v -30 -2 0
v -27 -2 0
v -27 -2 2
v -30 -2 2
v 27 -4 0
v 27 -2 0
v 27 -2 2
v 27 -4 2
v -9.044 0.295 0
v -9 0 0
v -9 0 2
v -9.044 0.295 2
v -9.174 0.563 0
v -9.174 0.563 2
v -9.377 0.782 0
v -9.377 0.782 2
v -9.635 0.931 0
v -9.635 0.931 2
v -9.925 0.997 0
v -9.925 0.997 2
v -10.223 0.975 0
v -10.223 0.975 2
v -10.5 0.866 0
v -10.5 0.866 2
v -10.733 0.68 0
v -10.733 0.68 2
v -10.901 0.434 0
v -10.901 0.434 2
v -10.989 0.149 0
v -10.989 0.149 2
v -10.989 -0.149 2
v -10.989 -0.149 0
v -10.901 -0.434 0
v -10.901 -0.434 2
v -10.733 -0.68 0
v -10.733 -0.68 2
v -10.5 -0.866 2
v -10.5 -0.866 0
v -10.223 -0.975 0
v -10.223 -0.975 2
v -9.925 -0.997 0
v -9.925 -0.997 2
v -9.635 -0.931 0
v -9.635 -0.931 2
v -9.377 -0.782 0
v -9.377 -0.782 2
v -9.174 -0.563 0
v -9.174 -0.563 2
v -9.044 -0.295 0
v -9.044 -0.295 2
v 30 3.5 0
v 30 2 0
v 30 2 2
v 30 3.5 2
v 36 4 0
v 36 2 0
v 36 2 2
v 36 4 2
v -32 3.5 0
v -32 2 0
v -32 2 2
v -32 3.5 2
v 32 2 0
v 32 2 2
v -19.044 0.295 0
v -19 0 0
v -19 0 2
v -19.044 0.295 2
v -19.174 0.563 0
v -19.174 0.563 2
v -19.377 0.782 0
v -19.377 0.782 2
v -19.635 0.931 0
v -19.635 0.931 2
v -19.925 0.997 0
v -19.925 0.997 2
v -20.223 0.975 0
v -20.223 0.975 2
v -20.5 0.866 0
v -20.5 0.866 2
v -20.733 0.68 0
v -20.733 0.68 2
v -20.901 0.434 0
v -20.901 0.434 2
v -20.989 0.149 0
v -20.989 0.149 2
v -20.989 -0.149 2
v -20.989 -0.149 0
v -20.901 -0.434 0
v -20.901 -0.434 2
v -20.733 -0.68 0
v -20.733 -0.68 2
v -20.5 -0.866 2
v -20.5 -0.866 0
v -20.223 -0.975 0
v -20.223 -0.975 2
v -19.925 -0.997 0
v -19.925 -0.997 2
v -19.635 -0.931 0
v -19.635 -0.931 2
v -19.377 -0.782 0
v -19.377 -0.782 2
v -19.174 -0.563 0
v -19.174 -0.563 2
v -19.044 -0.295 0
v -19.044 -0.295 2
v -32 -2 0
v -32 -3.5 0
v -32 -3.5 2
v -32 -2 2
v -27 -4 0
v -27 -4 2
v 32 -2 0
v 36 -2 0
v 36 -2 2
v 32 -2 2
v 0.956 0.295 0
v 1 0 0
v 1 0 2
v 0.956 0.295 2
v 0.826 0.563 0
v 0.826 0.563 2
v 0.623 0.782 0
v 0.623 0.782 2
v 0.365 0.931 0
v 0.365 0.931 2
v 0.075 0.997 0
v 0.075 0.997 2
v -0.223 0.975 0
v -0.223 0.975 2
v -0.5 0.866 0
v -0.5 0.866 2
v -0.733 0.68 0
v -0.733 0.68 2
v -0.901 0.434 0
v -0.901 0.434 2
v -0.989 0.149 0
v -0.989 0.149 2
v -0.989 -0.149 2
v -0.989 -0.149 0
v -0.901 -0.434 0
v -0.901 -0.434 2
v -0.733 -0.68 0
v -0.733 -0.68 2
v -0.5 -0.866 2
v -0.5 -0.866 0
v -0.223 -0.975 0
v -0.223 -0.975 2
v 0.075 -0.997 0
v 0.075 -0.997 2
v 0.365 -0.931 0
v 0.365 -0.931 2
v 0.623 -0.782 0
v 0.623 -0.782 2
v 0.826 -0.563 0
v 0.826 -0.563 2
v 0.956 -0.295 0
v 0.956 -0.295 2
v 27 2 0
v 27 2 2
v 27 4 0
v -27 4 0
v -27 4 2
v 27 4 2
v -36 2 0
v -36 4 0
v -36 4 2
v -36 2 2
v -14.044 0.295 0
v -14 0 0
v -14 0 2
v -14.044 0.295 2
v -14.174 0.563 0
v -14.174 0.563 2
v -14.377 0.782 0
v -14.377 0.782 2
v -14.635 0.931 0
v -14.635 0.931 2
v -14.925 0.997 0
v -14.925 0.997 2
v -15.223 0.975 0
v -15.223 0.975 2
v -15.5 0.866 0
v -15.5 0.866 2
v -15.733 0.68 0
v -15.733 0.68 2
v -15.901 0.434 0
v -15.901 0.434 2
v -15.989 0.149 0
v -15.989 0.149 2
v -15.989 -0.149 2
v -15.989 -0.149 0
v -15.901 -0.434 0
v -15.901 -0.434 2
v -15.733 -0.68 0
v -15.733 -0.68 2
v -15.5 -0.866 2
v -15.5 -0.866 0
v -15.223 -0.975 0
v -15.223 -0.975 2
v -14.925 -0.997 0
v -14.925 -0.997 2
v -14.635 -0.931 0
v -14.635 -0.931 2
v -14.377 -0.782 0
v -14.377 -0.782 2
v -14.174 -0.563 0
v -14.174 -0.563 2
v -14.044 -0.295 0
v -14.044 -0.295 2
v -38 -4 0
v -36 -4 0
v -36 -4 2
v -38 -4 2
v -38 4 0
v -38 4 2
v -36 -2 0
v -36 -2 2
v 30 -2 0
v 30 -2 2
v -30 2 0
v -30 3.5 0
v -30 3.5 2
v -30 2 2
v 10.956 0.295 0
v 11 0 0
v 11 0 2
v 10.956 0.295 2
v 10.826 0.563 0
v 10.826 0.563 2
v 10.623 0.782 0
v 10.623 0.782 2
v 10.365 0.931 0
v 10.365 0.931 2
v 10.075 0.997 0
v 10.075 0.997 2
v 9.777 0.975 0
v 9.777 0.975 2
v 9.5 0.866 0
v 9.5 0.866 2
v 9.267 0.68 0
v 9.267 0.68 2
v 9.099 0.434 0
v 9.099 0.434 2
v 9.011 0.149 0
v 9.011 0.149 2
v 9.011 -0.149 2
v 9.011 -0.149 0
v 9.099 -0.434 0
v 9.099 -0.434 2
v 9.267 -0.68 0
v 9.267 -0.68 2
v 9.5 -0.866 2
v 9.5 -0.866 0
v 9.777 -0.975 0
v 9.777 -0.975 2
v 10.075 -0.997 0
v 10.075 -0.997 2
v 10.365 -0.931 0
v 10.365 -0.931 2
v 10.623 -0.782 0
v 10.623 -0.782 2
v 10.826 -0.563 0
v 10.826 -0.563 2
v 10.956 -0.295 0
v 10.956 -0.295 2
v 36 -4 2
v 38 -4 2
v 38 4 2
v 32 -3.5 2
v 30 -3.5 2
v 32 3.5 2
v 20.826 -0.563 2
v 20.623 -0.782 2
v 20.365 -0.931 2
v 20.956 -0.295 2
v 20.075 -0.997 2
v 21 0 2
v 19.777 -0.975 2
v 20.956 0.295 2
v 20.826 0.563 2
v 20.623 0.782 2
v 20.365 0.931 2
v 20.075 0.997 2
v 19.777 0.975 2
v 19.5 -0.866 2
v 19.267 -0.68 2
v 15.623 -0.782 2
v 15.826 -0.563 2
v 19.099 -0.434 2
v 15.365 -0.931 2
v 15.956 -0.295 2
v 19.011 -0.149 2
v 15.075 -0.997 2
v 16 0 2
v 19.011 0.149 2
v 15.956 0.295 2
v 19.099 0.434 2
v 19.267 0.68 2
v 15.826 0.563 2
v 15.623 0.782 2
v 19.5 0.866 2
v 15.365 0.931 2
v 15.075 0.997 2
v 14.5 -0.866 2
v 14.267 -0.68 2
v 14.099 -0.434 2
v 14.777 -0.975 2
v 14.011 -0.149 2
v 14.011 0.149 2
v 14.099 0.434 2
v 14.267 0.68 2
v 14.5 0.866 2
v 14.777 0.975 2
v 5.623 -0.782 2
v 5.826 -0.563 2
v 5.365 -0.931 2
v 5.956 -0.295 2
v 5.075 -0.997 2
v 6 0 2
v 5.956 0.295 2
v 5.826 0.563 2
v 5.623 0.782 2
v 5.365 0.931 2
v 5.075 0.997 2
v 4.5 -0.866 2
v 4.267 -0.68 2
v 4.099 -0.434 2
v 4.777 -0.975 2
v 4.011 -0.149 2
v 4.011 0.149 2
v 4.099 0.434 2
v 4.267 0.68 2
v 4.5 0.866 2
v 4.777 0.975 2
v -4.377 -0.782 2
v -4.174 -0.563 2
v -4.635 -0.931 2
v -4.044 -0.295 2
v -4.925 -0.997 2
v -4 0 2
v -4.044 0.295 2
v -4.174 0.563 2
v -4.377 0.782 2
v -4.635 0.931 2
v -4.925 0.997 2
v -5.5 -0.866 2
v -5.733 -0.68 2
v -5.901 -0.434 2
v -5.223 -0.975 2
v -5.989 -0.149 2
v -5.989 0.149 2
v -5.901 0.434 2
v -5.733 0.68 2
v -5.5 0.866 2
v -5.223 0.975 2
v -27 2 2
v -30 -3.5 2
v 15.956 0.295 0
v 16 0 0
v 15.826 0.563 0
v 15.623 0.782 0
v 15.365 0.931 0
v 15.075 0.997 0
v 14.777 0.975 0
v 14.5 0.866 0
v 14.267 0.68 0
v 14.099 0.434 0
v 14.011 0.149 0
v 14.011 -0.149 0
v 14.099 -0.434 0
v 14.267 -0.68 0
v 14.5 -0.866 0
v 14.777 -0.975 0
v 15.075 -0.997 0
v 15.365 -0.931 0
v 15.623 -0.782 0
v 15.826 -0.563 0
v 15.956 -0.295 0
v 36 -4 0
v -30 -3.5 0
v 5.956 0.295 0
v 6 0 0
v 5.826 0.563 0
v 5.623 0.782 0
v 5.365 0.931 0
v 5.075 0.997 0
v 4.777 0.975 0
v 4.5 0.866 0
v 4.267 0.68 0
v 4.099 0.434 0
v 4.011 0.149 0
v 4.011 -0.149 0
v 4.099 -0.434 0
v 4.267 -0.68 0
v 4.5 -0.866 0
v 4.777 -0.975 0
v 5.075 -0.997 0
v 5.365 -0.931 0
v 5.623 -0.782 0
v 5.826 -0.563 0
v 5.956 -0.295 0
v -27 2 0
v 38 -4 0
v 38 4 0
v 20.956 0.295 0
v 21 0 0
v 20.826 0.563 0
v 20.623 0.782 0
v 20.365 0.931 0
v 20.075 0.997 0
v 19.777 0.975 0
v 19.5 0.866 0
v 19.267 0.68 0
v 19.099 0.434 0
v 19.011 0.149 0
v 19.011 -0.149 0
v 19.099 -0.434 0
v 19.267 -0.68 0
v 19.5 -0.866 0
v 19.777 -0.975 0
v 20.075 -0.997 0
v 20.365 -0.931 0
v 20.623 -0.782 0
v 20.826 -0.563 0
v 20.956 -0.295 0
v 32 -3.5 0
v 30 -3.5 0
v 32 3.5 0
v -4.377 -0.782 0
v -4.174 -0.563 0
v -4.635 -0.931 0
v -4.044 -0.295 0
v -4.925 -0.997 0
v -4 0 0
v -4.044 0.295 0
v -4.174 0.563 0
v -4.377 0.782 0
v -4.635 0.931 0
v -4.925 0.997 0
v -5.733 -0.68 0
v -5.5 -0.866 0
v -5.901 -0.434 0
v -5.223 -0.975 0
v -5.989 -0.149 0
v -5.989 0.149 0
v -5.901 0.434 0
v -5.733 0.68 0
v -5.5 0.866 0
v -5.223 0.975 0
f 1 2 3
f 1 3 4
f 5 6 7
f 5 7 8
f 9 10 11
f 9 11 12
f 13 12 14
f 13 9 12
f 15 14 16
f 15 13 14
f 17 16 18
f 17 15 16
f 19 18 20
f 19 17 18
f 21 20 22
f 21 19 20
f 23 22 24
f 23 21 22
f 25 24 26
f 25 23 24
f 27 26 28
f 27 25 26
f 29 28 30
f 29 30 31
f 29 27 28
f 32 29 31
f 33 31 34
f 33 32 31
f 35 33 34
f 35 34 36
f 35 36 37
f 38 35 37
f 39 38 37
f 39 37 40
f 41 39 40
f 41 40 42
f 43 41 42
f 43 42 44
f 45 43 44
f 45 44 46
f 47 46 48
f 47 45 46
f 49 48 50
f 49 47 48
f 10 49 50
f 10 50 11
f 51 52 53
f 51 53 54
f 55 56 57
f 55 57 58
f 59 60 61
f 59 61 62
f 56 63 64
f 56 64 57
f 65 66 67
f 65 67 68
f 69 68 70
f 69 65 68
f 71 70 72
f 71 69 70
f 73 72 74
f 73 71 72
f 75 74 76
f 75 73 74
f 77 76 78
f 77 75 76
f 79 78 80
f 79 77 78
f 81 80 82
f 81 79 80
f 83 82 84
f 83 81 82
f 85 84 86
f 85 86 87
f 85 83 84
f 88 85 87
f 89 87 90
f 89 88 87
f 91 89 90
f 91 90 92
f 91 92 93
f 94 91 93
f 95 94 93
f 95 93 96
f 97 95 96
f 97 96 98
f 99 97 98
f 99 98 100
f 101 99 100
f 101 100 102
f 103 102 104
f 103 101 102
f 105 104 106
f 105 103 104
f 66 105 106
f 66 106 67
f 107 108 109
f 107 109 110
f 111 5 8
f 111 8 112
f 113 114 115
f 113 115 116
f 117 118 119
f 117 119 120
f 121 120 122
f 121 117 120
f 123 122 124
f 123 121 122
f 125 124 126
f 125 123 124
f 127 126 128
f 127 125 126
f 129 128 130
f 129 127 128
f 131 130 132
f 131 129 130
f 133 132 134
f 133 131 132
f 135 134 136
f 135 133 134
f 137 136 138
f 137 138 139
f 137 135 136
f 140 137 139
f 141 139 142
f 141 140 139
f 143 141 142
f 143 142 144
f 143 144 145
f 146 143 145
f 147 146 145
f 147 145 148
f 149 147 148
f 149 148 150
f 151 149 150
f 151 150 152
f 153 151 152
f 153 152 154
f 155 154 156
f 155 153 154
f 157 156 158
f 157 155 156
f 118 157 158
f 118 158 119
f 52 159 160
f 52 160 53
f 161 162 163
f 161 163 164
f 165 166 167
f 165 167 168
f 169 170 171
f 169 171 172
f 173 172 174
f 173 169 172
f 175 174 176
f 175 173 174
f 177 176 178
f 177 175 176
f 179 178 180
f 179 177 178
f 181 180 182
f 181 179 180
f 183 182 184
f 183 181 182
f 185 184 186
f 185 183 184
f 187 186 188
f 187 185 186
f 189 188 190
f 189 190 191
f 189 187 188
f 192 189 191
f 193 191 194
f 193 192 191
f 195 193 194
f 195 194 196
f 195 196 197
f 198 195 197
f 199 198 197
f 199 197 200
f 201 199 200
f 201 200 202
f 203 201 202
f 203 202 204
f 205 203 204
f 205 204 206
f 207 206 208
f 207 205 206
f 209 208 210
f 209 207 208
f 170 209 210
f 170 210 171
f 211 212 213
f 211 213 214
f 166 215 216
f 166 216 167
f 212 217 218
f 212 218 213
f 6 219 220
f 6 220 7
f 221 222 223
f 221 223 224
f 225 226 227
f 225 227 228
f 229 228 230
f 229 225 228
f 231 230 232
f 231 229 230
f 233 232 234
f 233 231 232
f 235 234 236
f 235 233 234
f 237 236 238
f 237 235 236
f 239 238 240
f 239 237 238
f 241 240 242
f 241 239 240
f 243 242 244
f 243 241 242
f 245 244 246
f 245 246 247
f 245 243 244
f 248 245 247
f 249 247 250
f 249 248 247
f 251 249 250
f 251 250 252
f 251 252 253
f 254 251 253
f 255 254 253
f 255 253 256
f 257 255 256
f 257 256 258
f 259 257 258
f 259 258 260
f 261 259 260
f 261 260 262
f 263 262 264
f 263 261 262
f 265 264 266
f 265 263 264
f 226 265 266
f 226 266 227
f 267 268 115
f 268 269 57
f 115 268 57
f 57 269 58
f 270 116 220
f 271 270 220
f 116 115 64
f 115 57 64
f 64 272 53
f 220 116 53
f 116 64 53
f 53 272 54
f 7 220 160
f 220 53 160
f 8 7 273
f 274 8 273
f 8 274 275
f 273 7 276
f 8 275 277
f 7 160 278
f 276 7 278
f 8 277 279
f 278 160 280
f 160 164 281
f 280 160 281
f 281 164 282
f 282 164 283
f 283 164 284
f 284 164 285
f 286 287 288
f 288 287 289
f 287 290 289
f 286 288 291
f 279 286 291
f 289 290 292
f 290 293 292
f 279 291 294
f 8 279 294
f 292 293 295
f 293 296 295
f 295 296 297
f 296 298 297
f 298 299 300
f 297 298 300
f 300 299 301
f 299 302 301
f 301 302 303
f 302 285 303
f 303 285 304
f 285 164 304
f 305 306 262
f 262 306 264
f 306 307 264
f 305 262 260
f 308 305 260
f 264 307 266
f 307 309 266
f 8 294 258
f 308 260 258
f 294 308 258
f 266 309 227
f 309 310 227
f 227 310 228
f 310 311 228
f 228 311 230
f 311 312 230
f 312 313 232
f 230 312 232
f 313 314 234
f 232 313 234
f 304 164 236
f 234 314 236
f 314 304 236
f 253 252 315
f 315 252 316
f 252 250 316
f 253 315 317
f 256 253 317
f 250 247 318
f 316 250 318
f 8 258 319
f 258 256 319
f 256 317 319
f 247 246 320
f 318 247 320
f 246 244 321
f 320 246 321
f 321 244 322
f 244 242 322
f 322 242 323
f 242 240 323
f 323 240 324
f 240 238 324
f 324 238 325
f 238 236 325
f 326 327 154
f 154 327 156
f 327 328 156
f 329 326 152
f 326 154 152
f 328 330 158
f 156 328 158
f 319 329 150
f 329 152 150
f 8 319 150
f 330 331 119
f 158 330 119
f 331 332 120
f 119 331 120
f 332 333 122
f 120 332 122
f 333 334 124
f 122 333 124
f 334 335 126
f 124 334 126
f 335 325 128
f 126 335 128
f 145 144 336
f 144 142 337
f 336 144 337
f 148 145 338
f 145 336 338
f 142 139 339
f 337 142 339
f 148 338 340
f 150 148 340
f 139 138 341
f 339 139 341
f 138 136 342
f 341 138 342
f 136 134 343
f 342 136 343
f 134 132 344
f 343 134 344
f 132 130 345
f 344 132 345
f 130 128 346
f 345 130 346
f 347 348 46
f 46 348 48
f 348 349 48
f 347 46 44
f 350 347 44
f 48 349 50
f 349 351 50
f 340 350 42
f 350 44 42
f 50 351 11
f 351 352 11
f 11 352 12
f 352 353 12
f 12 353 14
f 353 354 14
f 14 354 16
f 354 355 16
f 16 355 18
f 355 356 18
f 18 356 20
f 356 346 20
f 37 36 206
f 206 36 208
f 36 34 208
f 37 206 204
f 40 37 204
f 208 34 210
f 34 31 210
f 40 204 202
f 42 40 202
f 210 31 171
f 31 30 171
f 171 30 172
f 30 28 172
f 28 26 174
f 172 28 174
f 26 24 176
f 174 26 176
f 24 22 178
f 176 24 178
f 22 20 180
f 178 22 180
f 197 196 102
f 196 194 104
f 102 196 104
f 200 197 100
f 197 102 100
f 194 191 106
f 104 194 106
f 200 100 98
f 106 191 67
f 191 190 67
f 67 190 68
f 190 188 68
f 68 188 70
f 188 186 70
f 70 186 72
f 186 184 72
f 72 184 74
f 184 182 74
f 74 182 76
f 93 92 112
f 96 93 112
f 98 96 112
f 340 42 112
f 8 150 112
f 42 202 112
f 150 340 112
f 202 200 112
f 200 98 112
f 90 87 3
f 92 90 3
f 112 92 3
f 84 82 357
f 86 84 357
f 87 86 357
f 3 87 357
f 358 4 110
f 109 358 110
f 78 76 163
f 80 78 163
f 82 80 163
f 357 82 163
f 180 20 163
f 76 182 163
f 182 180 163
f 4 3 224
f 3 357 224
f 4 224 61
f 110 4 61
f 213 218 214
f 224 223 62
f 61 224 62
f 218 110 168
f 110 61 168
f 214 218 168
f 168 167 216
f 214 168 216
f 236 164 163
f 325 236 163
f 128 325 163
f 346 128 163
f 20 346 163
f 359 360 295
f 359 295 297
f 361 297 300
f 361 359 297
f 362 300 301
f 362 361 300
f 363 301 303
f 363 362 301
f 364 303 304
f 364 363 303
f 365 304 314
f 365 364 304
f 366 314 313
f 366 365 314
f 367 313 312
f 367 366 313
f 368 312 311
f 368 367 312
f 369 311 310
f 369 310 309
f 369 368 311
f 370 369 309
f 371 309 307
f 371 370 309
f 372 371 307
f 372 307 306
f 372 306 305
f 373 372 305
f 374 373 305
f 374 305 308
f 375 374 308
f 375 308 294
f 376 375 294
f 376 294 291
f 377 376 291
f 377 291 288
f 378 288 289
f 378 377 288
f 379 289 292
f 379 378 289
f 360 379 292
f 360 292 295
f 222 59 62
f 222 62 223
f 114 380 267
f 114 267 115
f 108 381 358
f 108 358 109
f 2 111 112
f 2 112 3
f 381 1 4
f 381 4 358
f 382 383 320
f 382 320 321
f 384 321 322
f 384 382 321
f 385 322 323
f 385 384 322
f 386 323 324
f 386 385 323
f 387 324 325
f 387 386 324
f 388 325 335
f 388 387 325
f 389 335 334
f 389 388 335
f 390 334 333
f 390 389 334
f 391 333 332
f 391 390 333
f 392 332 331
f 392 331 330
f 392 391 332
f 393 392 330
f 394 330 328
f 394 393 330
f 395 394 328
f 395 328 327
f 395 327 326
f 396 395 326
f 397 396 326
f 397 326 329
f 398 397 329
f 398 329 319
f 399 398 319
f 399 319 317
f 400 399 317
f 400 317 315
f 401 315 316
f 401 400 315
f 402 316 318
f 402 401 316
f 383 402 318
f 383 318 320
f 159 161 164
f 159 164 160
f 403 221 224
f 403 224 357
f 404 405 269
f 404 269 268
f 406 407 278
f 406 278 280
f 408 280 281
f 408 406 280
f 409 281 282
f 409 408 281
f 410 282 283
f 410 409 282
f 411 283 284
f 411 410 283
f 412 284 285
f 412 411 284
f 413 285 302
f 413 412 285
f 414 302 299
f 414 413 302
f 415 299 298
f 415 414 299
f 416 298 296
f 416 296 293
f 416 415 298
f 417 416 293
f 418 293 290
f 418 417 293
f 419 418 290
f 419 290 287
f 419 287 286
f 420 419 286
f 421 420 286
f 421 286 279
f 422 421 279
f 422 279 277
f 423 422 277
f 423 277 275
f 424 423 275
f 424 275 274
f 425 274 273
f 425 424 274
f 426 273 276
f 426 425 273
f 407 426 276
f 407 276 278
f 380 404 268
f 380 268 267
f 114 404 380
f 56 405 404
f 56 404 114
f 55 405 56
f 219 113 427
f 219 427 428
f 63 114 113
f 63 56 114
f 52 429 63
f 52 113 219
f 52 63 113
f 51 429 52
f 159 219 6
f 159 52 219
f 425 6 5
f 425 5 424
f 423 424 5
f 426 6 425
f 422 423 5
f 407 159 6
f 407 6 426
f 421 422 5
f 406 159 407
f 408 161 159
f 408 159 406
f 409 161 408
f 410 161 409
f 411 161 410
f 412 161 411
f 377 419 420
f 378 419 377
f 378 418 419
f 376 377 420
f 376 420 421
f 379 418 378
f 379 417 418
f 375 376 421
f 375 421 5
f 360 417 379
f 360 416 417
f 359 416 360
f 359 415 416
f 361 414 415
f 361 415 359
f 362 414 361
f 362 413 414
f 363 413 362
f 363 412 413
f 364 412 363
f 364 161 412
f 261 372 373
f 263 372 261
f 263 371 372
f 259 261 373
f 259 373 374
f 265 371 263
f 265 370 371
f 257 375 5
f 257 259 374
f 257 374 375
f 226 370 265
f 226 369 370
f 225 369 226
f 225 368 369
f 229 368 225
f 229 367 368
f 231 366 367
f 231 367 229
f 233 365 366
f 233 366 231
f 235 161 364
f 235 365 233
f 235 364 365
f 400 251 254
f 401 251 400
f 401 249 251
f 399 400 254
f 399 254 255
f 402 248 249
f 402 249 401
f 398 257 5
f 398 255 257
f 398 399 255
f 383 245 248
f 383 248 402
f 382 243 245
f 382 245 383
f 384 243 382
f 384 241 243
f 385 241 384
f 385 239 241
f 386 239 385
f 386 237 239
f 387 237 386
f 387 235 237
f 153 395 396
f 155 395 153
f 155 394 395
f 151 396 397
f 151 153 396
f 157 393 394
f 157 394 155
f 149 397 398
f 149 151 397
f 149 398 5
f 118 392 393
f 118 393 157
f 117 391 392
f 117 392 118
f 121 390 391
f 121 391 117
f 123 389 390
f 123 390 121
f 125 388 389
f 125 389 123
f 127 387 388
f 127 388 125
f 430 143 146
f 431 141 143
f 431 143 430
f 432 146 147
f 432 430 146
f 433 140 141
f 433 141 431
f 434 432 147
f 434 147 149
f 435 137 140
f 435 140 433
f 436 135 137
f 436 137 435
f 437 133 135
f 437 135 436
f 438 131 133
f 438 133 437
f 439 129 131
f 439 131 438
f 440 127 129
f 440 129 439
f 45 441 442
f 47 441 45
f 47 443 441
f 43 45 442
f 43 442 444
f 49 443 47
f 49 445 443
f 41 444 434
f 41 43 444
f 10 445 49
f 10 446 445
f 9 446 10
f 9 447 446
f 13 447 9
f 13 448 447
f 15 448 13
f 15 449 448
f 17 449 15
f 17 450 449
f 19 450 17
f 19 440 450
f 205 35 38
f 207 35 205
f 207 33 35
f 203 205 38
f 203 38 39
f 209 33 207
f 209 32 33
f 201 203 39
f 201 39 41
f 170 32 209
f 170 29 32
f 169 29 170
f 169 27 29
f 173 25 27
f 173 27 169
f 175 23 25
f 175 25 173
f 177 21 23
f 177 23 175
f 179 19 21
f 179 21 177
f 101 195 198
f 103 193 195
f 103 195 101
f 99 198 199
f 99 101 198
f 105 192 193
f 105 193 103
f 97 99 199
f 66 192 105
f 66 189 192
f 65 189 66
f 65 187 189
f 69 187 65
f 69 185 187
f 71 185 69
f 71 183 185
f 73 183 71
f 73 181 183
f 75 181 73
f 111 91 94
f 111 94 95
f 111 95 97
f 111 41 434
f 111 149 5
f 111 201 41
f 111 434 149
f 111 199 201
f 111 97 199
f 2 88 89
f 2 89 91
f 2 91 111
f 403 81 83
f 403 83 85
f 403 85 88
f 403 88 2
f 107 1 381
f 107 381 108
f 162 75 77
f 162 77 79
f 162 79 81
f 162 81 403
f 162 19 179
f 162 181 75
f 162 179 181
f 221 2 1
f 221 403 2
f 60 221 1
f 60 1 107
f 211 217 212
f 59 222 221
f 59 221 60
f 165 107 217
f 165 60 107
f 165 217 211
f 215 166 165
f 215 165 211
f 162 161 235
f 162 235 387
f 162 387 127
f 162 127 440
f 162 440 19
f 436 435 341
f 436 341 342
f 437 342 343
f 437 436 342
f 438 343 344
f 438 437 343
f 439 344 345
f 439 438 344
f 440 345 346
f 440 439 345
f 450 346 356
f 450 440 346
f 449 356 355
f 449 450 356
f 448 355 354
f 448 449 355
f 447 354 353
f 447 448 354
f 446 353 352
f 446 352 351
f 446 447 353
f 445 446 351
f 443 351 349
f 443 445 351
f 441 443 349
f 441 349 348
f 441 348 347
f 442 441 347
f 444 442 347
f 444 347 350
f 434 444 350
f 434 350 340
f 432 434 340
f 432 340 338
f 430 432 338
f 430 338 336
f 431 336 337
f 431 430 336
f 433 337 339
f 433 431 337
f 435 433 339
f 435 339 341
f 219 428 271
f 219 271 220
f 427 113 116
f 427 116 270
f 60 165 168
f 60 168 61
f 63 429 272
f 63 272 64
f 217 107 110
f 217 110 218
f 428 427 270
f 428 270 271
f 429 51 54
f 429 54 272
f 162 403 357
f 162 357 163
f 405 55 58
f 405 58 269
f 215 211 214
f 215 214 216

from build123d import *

# Parameters (mm, degrees)
SKETCH_1_R      = 1
EXTRUDE_1_DEPTH = 2


with BuildPart() as part:
    # 草图1 → 凸台-拉伸1 (new body)
    with BuildSketch(Plane.XY):
        Polygon((-27, 4), (27, 4), (27, 2), (30, 2), (30, 3.5), (32, 3.5), (32, 2), (36, 2), (36, 4), (38, 4), (38, -4), (36, -4), (36, -2), (32, -2), (32, -3.5), (30, -3.5), (30, -2), (27, -2), (27, -4), (-27, -4), (-27, -2), (-30, -2), (-30, -3.5), (-32, -3.5), (-32, -2), (-36, -2), (-36, -4), (-38, -4), (-38, 4), (-36, 4), (-36, 2), (-32, 2), (-32, 3.5), (-30, 3.5), (-30, 2), (-27, 2), align=None)
        Circle(SKETCH_1_R, mode=Mode.SUBTRACT)
        with Locations((5, 0)):
            Circle(SKETCH_1_R, mode=Mode.SUBTRACT)
        with Locations((10, 0)):
            Circle(SKETCH_1_R, mode=Mode.SUBTRACT)
        with Locations((15, 0)):
            Circle(SKETCH_1_R, mode=Mode.SUBTRACT)
        with Locations((20, 0)):
            Circle(SKETCH_1_R, mode=Mode.SUBTRACT)
        with Locations((-5, 0)):
            Circle(SKETCH_1_R, mode=Mode.SUBTRACT)
        with Locations((-10, 0)):
            Circle(SKETCH_1_R, mode=Mode.SUBTRACT)
        with Locations((-15, 0)):
            Circle(SKETCH_1_R, mode=Mode.SUBTRACT)
        with Locations((-20, 0)):
            Circle(SKETCH_1_R, mode=Mode.SUBTRACT)
    extrude(amount=EXTRUDE_1_DEPTH)


solid = part.part
